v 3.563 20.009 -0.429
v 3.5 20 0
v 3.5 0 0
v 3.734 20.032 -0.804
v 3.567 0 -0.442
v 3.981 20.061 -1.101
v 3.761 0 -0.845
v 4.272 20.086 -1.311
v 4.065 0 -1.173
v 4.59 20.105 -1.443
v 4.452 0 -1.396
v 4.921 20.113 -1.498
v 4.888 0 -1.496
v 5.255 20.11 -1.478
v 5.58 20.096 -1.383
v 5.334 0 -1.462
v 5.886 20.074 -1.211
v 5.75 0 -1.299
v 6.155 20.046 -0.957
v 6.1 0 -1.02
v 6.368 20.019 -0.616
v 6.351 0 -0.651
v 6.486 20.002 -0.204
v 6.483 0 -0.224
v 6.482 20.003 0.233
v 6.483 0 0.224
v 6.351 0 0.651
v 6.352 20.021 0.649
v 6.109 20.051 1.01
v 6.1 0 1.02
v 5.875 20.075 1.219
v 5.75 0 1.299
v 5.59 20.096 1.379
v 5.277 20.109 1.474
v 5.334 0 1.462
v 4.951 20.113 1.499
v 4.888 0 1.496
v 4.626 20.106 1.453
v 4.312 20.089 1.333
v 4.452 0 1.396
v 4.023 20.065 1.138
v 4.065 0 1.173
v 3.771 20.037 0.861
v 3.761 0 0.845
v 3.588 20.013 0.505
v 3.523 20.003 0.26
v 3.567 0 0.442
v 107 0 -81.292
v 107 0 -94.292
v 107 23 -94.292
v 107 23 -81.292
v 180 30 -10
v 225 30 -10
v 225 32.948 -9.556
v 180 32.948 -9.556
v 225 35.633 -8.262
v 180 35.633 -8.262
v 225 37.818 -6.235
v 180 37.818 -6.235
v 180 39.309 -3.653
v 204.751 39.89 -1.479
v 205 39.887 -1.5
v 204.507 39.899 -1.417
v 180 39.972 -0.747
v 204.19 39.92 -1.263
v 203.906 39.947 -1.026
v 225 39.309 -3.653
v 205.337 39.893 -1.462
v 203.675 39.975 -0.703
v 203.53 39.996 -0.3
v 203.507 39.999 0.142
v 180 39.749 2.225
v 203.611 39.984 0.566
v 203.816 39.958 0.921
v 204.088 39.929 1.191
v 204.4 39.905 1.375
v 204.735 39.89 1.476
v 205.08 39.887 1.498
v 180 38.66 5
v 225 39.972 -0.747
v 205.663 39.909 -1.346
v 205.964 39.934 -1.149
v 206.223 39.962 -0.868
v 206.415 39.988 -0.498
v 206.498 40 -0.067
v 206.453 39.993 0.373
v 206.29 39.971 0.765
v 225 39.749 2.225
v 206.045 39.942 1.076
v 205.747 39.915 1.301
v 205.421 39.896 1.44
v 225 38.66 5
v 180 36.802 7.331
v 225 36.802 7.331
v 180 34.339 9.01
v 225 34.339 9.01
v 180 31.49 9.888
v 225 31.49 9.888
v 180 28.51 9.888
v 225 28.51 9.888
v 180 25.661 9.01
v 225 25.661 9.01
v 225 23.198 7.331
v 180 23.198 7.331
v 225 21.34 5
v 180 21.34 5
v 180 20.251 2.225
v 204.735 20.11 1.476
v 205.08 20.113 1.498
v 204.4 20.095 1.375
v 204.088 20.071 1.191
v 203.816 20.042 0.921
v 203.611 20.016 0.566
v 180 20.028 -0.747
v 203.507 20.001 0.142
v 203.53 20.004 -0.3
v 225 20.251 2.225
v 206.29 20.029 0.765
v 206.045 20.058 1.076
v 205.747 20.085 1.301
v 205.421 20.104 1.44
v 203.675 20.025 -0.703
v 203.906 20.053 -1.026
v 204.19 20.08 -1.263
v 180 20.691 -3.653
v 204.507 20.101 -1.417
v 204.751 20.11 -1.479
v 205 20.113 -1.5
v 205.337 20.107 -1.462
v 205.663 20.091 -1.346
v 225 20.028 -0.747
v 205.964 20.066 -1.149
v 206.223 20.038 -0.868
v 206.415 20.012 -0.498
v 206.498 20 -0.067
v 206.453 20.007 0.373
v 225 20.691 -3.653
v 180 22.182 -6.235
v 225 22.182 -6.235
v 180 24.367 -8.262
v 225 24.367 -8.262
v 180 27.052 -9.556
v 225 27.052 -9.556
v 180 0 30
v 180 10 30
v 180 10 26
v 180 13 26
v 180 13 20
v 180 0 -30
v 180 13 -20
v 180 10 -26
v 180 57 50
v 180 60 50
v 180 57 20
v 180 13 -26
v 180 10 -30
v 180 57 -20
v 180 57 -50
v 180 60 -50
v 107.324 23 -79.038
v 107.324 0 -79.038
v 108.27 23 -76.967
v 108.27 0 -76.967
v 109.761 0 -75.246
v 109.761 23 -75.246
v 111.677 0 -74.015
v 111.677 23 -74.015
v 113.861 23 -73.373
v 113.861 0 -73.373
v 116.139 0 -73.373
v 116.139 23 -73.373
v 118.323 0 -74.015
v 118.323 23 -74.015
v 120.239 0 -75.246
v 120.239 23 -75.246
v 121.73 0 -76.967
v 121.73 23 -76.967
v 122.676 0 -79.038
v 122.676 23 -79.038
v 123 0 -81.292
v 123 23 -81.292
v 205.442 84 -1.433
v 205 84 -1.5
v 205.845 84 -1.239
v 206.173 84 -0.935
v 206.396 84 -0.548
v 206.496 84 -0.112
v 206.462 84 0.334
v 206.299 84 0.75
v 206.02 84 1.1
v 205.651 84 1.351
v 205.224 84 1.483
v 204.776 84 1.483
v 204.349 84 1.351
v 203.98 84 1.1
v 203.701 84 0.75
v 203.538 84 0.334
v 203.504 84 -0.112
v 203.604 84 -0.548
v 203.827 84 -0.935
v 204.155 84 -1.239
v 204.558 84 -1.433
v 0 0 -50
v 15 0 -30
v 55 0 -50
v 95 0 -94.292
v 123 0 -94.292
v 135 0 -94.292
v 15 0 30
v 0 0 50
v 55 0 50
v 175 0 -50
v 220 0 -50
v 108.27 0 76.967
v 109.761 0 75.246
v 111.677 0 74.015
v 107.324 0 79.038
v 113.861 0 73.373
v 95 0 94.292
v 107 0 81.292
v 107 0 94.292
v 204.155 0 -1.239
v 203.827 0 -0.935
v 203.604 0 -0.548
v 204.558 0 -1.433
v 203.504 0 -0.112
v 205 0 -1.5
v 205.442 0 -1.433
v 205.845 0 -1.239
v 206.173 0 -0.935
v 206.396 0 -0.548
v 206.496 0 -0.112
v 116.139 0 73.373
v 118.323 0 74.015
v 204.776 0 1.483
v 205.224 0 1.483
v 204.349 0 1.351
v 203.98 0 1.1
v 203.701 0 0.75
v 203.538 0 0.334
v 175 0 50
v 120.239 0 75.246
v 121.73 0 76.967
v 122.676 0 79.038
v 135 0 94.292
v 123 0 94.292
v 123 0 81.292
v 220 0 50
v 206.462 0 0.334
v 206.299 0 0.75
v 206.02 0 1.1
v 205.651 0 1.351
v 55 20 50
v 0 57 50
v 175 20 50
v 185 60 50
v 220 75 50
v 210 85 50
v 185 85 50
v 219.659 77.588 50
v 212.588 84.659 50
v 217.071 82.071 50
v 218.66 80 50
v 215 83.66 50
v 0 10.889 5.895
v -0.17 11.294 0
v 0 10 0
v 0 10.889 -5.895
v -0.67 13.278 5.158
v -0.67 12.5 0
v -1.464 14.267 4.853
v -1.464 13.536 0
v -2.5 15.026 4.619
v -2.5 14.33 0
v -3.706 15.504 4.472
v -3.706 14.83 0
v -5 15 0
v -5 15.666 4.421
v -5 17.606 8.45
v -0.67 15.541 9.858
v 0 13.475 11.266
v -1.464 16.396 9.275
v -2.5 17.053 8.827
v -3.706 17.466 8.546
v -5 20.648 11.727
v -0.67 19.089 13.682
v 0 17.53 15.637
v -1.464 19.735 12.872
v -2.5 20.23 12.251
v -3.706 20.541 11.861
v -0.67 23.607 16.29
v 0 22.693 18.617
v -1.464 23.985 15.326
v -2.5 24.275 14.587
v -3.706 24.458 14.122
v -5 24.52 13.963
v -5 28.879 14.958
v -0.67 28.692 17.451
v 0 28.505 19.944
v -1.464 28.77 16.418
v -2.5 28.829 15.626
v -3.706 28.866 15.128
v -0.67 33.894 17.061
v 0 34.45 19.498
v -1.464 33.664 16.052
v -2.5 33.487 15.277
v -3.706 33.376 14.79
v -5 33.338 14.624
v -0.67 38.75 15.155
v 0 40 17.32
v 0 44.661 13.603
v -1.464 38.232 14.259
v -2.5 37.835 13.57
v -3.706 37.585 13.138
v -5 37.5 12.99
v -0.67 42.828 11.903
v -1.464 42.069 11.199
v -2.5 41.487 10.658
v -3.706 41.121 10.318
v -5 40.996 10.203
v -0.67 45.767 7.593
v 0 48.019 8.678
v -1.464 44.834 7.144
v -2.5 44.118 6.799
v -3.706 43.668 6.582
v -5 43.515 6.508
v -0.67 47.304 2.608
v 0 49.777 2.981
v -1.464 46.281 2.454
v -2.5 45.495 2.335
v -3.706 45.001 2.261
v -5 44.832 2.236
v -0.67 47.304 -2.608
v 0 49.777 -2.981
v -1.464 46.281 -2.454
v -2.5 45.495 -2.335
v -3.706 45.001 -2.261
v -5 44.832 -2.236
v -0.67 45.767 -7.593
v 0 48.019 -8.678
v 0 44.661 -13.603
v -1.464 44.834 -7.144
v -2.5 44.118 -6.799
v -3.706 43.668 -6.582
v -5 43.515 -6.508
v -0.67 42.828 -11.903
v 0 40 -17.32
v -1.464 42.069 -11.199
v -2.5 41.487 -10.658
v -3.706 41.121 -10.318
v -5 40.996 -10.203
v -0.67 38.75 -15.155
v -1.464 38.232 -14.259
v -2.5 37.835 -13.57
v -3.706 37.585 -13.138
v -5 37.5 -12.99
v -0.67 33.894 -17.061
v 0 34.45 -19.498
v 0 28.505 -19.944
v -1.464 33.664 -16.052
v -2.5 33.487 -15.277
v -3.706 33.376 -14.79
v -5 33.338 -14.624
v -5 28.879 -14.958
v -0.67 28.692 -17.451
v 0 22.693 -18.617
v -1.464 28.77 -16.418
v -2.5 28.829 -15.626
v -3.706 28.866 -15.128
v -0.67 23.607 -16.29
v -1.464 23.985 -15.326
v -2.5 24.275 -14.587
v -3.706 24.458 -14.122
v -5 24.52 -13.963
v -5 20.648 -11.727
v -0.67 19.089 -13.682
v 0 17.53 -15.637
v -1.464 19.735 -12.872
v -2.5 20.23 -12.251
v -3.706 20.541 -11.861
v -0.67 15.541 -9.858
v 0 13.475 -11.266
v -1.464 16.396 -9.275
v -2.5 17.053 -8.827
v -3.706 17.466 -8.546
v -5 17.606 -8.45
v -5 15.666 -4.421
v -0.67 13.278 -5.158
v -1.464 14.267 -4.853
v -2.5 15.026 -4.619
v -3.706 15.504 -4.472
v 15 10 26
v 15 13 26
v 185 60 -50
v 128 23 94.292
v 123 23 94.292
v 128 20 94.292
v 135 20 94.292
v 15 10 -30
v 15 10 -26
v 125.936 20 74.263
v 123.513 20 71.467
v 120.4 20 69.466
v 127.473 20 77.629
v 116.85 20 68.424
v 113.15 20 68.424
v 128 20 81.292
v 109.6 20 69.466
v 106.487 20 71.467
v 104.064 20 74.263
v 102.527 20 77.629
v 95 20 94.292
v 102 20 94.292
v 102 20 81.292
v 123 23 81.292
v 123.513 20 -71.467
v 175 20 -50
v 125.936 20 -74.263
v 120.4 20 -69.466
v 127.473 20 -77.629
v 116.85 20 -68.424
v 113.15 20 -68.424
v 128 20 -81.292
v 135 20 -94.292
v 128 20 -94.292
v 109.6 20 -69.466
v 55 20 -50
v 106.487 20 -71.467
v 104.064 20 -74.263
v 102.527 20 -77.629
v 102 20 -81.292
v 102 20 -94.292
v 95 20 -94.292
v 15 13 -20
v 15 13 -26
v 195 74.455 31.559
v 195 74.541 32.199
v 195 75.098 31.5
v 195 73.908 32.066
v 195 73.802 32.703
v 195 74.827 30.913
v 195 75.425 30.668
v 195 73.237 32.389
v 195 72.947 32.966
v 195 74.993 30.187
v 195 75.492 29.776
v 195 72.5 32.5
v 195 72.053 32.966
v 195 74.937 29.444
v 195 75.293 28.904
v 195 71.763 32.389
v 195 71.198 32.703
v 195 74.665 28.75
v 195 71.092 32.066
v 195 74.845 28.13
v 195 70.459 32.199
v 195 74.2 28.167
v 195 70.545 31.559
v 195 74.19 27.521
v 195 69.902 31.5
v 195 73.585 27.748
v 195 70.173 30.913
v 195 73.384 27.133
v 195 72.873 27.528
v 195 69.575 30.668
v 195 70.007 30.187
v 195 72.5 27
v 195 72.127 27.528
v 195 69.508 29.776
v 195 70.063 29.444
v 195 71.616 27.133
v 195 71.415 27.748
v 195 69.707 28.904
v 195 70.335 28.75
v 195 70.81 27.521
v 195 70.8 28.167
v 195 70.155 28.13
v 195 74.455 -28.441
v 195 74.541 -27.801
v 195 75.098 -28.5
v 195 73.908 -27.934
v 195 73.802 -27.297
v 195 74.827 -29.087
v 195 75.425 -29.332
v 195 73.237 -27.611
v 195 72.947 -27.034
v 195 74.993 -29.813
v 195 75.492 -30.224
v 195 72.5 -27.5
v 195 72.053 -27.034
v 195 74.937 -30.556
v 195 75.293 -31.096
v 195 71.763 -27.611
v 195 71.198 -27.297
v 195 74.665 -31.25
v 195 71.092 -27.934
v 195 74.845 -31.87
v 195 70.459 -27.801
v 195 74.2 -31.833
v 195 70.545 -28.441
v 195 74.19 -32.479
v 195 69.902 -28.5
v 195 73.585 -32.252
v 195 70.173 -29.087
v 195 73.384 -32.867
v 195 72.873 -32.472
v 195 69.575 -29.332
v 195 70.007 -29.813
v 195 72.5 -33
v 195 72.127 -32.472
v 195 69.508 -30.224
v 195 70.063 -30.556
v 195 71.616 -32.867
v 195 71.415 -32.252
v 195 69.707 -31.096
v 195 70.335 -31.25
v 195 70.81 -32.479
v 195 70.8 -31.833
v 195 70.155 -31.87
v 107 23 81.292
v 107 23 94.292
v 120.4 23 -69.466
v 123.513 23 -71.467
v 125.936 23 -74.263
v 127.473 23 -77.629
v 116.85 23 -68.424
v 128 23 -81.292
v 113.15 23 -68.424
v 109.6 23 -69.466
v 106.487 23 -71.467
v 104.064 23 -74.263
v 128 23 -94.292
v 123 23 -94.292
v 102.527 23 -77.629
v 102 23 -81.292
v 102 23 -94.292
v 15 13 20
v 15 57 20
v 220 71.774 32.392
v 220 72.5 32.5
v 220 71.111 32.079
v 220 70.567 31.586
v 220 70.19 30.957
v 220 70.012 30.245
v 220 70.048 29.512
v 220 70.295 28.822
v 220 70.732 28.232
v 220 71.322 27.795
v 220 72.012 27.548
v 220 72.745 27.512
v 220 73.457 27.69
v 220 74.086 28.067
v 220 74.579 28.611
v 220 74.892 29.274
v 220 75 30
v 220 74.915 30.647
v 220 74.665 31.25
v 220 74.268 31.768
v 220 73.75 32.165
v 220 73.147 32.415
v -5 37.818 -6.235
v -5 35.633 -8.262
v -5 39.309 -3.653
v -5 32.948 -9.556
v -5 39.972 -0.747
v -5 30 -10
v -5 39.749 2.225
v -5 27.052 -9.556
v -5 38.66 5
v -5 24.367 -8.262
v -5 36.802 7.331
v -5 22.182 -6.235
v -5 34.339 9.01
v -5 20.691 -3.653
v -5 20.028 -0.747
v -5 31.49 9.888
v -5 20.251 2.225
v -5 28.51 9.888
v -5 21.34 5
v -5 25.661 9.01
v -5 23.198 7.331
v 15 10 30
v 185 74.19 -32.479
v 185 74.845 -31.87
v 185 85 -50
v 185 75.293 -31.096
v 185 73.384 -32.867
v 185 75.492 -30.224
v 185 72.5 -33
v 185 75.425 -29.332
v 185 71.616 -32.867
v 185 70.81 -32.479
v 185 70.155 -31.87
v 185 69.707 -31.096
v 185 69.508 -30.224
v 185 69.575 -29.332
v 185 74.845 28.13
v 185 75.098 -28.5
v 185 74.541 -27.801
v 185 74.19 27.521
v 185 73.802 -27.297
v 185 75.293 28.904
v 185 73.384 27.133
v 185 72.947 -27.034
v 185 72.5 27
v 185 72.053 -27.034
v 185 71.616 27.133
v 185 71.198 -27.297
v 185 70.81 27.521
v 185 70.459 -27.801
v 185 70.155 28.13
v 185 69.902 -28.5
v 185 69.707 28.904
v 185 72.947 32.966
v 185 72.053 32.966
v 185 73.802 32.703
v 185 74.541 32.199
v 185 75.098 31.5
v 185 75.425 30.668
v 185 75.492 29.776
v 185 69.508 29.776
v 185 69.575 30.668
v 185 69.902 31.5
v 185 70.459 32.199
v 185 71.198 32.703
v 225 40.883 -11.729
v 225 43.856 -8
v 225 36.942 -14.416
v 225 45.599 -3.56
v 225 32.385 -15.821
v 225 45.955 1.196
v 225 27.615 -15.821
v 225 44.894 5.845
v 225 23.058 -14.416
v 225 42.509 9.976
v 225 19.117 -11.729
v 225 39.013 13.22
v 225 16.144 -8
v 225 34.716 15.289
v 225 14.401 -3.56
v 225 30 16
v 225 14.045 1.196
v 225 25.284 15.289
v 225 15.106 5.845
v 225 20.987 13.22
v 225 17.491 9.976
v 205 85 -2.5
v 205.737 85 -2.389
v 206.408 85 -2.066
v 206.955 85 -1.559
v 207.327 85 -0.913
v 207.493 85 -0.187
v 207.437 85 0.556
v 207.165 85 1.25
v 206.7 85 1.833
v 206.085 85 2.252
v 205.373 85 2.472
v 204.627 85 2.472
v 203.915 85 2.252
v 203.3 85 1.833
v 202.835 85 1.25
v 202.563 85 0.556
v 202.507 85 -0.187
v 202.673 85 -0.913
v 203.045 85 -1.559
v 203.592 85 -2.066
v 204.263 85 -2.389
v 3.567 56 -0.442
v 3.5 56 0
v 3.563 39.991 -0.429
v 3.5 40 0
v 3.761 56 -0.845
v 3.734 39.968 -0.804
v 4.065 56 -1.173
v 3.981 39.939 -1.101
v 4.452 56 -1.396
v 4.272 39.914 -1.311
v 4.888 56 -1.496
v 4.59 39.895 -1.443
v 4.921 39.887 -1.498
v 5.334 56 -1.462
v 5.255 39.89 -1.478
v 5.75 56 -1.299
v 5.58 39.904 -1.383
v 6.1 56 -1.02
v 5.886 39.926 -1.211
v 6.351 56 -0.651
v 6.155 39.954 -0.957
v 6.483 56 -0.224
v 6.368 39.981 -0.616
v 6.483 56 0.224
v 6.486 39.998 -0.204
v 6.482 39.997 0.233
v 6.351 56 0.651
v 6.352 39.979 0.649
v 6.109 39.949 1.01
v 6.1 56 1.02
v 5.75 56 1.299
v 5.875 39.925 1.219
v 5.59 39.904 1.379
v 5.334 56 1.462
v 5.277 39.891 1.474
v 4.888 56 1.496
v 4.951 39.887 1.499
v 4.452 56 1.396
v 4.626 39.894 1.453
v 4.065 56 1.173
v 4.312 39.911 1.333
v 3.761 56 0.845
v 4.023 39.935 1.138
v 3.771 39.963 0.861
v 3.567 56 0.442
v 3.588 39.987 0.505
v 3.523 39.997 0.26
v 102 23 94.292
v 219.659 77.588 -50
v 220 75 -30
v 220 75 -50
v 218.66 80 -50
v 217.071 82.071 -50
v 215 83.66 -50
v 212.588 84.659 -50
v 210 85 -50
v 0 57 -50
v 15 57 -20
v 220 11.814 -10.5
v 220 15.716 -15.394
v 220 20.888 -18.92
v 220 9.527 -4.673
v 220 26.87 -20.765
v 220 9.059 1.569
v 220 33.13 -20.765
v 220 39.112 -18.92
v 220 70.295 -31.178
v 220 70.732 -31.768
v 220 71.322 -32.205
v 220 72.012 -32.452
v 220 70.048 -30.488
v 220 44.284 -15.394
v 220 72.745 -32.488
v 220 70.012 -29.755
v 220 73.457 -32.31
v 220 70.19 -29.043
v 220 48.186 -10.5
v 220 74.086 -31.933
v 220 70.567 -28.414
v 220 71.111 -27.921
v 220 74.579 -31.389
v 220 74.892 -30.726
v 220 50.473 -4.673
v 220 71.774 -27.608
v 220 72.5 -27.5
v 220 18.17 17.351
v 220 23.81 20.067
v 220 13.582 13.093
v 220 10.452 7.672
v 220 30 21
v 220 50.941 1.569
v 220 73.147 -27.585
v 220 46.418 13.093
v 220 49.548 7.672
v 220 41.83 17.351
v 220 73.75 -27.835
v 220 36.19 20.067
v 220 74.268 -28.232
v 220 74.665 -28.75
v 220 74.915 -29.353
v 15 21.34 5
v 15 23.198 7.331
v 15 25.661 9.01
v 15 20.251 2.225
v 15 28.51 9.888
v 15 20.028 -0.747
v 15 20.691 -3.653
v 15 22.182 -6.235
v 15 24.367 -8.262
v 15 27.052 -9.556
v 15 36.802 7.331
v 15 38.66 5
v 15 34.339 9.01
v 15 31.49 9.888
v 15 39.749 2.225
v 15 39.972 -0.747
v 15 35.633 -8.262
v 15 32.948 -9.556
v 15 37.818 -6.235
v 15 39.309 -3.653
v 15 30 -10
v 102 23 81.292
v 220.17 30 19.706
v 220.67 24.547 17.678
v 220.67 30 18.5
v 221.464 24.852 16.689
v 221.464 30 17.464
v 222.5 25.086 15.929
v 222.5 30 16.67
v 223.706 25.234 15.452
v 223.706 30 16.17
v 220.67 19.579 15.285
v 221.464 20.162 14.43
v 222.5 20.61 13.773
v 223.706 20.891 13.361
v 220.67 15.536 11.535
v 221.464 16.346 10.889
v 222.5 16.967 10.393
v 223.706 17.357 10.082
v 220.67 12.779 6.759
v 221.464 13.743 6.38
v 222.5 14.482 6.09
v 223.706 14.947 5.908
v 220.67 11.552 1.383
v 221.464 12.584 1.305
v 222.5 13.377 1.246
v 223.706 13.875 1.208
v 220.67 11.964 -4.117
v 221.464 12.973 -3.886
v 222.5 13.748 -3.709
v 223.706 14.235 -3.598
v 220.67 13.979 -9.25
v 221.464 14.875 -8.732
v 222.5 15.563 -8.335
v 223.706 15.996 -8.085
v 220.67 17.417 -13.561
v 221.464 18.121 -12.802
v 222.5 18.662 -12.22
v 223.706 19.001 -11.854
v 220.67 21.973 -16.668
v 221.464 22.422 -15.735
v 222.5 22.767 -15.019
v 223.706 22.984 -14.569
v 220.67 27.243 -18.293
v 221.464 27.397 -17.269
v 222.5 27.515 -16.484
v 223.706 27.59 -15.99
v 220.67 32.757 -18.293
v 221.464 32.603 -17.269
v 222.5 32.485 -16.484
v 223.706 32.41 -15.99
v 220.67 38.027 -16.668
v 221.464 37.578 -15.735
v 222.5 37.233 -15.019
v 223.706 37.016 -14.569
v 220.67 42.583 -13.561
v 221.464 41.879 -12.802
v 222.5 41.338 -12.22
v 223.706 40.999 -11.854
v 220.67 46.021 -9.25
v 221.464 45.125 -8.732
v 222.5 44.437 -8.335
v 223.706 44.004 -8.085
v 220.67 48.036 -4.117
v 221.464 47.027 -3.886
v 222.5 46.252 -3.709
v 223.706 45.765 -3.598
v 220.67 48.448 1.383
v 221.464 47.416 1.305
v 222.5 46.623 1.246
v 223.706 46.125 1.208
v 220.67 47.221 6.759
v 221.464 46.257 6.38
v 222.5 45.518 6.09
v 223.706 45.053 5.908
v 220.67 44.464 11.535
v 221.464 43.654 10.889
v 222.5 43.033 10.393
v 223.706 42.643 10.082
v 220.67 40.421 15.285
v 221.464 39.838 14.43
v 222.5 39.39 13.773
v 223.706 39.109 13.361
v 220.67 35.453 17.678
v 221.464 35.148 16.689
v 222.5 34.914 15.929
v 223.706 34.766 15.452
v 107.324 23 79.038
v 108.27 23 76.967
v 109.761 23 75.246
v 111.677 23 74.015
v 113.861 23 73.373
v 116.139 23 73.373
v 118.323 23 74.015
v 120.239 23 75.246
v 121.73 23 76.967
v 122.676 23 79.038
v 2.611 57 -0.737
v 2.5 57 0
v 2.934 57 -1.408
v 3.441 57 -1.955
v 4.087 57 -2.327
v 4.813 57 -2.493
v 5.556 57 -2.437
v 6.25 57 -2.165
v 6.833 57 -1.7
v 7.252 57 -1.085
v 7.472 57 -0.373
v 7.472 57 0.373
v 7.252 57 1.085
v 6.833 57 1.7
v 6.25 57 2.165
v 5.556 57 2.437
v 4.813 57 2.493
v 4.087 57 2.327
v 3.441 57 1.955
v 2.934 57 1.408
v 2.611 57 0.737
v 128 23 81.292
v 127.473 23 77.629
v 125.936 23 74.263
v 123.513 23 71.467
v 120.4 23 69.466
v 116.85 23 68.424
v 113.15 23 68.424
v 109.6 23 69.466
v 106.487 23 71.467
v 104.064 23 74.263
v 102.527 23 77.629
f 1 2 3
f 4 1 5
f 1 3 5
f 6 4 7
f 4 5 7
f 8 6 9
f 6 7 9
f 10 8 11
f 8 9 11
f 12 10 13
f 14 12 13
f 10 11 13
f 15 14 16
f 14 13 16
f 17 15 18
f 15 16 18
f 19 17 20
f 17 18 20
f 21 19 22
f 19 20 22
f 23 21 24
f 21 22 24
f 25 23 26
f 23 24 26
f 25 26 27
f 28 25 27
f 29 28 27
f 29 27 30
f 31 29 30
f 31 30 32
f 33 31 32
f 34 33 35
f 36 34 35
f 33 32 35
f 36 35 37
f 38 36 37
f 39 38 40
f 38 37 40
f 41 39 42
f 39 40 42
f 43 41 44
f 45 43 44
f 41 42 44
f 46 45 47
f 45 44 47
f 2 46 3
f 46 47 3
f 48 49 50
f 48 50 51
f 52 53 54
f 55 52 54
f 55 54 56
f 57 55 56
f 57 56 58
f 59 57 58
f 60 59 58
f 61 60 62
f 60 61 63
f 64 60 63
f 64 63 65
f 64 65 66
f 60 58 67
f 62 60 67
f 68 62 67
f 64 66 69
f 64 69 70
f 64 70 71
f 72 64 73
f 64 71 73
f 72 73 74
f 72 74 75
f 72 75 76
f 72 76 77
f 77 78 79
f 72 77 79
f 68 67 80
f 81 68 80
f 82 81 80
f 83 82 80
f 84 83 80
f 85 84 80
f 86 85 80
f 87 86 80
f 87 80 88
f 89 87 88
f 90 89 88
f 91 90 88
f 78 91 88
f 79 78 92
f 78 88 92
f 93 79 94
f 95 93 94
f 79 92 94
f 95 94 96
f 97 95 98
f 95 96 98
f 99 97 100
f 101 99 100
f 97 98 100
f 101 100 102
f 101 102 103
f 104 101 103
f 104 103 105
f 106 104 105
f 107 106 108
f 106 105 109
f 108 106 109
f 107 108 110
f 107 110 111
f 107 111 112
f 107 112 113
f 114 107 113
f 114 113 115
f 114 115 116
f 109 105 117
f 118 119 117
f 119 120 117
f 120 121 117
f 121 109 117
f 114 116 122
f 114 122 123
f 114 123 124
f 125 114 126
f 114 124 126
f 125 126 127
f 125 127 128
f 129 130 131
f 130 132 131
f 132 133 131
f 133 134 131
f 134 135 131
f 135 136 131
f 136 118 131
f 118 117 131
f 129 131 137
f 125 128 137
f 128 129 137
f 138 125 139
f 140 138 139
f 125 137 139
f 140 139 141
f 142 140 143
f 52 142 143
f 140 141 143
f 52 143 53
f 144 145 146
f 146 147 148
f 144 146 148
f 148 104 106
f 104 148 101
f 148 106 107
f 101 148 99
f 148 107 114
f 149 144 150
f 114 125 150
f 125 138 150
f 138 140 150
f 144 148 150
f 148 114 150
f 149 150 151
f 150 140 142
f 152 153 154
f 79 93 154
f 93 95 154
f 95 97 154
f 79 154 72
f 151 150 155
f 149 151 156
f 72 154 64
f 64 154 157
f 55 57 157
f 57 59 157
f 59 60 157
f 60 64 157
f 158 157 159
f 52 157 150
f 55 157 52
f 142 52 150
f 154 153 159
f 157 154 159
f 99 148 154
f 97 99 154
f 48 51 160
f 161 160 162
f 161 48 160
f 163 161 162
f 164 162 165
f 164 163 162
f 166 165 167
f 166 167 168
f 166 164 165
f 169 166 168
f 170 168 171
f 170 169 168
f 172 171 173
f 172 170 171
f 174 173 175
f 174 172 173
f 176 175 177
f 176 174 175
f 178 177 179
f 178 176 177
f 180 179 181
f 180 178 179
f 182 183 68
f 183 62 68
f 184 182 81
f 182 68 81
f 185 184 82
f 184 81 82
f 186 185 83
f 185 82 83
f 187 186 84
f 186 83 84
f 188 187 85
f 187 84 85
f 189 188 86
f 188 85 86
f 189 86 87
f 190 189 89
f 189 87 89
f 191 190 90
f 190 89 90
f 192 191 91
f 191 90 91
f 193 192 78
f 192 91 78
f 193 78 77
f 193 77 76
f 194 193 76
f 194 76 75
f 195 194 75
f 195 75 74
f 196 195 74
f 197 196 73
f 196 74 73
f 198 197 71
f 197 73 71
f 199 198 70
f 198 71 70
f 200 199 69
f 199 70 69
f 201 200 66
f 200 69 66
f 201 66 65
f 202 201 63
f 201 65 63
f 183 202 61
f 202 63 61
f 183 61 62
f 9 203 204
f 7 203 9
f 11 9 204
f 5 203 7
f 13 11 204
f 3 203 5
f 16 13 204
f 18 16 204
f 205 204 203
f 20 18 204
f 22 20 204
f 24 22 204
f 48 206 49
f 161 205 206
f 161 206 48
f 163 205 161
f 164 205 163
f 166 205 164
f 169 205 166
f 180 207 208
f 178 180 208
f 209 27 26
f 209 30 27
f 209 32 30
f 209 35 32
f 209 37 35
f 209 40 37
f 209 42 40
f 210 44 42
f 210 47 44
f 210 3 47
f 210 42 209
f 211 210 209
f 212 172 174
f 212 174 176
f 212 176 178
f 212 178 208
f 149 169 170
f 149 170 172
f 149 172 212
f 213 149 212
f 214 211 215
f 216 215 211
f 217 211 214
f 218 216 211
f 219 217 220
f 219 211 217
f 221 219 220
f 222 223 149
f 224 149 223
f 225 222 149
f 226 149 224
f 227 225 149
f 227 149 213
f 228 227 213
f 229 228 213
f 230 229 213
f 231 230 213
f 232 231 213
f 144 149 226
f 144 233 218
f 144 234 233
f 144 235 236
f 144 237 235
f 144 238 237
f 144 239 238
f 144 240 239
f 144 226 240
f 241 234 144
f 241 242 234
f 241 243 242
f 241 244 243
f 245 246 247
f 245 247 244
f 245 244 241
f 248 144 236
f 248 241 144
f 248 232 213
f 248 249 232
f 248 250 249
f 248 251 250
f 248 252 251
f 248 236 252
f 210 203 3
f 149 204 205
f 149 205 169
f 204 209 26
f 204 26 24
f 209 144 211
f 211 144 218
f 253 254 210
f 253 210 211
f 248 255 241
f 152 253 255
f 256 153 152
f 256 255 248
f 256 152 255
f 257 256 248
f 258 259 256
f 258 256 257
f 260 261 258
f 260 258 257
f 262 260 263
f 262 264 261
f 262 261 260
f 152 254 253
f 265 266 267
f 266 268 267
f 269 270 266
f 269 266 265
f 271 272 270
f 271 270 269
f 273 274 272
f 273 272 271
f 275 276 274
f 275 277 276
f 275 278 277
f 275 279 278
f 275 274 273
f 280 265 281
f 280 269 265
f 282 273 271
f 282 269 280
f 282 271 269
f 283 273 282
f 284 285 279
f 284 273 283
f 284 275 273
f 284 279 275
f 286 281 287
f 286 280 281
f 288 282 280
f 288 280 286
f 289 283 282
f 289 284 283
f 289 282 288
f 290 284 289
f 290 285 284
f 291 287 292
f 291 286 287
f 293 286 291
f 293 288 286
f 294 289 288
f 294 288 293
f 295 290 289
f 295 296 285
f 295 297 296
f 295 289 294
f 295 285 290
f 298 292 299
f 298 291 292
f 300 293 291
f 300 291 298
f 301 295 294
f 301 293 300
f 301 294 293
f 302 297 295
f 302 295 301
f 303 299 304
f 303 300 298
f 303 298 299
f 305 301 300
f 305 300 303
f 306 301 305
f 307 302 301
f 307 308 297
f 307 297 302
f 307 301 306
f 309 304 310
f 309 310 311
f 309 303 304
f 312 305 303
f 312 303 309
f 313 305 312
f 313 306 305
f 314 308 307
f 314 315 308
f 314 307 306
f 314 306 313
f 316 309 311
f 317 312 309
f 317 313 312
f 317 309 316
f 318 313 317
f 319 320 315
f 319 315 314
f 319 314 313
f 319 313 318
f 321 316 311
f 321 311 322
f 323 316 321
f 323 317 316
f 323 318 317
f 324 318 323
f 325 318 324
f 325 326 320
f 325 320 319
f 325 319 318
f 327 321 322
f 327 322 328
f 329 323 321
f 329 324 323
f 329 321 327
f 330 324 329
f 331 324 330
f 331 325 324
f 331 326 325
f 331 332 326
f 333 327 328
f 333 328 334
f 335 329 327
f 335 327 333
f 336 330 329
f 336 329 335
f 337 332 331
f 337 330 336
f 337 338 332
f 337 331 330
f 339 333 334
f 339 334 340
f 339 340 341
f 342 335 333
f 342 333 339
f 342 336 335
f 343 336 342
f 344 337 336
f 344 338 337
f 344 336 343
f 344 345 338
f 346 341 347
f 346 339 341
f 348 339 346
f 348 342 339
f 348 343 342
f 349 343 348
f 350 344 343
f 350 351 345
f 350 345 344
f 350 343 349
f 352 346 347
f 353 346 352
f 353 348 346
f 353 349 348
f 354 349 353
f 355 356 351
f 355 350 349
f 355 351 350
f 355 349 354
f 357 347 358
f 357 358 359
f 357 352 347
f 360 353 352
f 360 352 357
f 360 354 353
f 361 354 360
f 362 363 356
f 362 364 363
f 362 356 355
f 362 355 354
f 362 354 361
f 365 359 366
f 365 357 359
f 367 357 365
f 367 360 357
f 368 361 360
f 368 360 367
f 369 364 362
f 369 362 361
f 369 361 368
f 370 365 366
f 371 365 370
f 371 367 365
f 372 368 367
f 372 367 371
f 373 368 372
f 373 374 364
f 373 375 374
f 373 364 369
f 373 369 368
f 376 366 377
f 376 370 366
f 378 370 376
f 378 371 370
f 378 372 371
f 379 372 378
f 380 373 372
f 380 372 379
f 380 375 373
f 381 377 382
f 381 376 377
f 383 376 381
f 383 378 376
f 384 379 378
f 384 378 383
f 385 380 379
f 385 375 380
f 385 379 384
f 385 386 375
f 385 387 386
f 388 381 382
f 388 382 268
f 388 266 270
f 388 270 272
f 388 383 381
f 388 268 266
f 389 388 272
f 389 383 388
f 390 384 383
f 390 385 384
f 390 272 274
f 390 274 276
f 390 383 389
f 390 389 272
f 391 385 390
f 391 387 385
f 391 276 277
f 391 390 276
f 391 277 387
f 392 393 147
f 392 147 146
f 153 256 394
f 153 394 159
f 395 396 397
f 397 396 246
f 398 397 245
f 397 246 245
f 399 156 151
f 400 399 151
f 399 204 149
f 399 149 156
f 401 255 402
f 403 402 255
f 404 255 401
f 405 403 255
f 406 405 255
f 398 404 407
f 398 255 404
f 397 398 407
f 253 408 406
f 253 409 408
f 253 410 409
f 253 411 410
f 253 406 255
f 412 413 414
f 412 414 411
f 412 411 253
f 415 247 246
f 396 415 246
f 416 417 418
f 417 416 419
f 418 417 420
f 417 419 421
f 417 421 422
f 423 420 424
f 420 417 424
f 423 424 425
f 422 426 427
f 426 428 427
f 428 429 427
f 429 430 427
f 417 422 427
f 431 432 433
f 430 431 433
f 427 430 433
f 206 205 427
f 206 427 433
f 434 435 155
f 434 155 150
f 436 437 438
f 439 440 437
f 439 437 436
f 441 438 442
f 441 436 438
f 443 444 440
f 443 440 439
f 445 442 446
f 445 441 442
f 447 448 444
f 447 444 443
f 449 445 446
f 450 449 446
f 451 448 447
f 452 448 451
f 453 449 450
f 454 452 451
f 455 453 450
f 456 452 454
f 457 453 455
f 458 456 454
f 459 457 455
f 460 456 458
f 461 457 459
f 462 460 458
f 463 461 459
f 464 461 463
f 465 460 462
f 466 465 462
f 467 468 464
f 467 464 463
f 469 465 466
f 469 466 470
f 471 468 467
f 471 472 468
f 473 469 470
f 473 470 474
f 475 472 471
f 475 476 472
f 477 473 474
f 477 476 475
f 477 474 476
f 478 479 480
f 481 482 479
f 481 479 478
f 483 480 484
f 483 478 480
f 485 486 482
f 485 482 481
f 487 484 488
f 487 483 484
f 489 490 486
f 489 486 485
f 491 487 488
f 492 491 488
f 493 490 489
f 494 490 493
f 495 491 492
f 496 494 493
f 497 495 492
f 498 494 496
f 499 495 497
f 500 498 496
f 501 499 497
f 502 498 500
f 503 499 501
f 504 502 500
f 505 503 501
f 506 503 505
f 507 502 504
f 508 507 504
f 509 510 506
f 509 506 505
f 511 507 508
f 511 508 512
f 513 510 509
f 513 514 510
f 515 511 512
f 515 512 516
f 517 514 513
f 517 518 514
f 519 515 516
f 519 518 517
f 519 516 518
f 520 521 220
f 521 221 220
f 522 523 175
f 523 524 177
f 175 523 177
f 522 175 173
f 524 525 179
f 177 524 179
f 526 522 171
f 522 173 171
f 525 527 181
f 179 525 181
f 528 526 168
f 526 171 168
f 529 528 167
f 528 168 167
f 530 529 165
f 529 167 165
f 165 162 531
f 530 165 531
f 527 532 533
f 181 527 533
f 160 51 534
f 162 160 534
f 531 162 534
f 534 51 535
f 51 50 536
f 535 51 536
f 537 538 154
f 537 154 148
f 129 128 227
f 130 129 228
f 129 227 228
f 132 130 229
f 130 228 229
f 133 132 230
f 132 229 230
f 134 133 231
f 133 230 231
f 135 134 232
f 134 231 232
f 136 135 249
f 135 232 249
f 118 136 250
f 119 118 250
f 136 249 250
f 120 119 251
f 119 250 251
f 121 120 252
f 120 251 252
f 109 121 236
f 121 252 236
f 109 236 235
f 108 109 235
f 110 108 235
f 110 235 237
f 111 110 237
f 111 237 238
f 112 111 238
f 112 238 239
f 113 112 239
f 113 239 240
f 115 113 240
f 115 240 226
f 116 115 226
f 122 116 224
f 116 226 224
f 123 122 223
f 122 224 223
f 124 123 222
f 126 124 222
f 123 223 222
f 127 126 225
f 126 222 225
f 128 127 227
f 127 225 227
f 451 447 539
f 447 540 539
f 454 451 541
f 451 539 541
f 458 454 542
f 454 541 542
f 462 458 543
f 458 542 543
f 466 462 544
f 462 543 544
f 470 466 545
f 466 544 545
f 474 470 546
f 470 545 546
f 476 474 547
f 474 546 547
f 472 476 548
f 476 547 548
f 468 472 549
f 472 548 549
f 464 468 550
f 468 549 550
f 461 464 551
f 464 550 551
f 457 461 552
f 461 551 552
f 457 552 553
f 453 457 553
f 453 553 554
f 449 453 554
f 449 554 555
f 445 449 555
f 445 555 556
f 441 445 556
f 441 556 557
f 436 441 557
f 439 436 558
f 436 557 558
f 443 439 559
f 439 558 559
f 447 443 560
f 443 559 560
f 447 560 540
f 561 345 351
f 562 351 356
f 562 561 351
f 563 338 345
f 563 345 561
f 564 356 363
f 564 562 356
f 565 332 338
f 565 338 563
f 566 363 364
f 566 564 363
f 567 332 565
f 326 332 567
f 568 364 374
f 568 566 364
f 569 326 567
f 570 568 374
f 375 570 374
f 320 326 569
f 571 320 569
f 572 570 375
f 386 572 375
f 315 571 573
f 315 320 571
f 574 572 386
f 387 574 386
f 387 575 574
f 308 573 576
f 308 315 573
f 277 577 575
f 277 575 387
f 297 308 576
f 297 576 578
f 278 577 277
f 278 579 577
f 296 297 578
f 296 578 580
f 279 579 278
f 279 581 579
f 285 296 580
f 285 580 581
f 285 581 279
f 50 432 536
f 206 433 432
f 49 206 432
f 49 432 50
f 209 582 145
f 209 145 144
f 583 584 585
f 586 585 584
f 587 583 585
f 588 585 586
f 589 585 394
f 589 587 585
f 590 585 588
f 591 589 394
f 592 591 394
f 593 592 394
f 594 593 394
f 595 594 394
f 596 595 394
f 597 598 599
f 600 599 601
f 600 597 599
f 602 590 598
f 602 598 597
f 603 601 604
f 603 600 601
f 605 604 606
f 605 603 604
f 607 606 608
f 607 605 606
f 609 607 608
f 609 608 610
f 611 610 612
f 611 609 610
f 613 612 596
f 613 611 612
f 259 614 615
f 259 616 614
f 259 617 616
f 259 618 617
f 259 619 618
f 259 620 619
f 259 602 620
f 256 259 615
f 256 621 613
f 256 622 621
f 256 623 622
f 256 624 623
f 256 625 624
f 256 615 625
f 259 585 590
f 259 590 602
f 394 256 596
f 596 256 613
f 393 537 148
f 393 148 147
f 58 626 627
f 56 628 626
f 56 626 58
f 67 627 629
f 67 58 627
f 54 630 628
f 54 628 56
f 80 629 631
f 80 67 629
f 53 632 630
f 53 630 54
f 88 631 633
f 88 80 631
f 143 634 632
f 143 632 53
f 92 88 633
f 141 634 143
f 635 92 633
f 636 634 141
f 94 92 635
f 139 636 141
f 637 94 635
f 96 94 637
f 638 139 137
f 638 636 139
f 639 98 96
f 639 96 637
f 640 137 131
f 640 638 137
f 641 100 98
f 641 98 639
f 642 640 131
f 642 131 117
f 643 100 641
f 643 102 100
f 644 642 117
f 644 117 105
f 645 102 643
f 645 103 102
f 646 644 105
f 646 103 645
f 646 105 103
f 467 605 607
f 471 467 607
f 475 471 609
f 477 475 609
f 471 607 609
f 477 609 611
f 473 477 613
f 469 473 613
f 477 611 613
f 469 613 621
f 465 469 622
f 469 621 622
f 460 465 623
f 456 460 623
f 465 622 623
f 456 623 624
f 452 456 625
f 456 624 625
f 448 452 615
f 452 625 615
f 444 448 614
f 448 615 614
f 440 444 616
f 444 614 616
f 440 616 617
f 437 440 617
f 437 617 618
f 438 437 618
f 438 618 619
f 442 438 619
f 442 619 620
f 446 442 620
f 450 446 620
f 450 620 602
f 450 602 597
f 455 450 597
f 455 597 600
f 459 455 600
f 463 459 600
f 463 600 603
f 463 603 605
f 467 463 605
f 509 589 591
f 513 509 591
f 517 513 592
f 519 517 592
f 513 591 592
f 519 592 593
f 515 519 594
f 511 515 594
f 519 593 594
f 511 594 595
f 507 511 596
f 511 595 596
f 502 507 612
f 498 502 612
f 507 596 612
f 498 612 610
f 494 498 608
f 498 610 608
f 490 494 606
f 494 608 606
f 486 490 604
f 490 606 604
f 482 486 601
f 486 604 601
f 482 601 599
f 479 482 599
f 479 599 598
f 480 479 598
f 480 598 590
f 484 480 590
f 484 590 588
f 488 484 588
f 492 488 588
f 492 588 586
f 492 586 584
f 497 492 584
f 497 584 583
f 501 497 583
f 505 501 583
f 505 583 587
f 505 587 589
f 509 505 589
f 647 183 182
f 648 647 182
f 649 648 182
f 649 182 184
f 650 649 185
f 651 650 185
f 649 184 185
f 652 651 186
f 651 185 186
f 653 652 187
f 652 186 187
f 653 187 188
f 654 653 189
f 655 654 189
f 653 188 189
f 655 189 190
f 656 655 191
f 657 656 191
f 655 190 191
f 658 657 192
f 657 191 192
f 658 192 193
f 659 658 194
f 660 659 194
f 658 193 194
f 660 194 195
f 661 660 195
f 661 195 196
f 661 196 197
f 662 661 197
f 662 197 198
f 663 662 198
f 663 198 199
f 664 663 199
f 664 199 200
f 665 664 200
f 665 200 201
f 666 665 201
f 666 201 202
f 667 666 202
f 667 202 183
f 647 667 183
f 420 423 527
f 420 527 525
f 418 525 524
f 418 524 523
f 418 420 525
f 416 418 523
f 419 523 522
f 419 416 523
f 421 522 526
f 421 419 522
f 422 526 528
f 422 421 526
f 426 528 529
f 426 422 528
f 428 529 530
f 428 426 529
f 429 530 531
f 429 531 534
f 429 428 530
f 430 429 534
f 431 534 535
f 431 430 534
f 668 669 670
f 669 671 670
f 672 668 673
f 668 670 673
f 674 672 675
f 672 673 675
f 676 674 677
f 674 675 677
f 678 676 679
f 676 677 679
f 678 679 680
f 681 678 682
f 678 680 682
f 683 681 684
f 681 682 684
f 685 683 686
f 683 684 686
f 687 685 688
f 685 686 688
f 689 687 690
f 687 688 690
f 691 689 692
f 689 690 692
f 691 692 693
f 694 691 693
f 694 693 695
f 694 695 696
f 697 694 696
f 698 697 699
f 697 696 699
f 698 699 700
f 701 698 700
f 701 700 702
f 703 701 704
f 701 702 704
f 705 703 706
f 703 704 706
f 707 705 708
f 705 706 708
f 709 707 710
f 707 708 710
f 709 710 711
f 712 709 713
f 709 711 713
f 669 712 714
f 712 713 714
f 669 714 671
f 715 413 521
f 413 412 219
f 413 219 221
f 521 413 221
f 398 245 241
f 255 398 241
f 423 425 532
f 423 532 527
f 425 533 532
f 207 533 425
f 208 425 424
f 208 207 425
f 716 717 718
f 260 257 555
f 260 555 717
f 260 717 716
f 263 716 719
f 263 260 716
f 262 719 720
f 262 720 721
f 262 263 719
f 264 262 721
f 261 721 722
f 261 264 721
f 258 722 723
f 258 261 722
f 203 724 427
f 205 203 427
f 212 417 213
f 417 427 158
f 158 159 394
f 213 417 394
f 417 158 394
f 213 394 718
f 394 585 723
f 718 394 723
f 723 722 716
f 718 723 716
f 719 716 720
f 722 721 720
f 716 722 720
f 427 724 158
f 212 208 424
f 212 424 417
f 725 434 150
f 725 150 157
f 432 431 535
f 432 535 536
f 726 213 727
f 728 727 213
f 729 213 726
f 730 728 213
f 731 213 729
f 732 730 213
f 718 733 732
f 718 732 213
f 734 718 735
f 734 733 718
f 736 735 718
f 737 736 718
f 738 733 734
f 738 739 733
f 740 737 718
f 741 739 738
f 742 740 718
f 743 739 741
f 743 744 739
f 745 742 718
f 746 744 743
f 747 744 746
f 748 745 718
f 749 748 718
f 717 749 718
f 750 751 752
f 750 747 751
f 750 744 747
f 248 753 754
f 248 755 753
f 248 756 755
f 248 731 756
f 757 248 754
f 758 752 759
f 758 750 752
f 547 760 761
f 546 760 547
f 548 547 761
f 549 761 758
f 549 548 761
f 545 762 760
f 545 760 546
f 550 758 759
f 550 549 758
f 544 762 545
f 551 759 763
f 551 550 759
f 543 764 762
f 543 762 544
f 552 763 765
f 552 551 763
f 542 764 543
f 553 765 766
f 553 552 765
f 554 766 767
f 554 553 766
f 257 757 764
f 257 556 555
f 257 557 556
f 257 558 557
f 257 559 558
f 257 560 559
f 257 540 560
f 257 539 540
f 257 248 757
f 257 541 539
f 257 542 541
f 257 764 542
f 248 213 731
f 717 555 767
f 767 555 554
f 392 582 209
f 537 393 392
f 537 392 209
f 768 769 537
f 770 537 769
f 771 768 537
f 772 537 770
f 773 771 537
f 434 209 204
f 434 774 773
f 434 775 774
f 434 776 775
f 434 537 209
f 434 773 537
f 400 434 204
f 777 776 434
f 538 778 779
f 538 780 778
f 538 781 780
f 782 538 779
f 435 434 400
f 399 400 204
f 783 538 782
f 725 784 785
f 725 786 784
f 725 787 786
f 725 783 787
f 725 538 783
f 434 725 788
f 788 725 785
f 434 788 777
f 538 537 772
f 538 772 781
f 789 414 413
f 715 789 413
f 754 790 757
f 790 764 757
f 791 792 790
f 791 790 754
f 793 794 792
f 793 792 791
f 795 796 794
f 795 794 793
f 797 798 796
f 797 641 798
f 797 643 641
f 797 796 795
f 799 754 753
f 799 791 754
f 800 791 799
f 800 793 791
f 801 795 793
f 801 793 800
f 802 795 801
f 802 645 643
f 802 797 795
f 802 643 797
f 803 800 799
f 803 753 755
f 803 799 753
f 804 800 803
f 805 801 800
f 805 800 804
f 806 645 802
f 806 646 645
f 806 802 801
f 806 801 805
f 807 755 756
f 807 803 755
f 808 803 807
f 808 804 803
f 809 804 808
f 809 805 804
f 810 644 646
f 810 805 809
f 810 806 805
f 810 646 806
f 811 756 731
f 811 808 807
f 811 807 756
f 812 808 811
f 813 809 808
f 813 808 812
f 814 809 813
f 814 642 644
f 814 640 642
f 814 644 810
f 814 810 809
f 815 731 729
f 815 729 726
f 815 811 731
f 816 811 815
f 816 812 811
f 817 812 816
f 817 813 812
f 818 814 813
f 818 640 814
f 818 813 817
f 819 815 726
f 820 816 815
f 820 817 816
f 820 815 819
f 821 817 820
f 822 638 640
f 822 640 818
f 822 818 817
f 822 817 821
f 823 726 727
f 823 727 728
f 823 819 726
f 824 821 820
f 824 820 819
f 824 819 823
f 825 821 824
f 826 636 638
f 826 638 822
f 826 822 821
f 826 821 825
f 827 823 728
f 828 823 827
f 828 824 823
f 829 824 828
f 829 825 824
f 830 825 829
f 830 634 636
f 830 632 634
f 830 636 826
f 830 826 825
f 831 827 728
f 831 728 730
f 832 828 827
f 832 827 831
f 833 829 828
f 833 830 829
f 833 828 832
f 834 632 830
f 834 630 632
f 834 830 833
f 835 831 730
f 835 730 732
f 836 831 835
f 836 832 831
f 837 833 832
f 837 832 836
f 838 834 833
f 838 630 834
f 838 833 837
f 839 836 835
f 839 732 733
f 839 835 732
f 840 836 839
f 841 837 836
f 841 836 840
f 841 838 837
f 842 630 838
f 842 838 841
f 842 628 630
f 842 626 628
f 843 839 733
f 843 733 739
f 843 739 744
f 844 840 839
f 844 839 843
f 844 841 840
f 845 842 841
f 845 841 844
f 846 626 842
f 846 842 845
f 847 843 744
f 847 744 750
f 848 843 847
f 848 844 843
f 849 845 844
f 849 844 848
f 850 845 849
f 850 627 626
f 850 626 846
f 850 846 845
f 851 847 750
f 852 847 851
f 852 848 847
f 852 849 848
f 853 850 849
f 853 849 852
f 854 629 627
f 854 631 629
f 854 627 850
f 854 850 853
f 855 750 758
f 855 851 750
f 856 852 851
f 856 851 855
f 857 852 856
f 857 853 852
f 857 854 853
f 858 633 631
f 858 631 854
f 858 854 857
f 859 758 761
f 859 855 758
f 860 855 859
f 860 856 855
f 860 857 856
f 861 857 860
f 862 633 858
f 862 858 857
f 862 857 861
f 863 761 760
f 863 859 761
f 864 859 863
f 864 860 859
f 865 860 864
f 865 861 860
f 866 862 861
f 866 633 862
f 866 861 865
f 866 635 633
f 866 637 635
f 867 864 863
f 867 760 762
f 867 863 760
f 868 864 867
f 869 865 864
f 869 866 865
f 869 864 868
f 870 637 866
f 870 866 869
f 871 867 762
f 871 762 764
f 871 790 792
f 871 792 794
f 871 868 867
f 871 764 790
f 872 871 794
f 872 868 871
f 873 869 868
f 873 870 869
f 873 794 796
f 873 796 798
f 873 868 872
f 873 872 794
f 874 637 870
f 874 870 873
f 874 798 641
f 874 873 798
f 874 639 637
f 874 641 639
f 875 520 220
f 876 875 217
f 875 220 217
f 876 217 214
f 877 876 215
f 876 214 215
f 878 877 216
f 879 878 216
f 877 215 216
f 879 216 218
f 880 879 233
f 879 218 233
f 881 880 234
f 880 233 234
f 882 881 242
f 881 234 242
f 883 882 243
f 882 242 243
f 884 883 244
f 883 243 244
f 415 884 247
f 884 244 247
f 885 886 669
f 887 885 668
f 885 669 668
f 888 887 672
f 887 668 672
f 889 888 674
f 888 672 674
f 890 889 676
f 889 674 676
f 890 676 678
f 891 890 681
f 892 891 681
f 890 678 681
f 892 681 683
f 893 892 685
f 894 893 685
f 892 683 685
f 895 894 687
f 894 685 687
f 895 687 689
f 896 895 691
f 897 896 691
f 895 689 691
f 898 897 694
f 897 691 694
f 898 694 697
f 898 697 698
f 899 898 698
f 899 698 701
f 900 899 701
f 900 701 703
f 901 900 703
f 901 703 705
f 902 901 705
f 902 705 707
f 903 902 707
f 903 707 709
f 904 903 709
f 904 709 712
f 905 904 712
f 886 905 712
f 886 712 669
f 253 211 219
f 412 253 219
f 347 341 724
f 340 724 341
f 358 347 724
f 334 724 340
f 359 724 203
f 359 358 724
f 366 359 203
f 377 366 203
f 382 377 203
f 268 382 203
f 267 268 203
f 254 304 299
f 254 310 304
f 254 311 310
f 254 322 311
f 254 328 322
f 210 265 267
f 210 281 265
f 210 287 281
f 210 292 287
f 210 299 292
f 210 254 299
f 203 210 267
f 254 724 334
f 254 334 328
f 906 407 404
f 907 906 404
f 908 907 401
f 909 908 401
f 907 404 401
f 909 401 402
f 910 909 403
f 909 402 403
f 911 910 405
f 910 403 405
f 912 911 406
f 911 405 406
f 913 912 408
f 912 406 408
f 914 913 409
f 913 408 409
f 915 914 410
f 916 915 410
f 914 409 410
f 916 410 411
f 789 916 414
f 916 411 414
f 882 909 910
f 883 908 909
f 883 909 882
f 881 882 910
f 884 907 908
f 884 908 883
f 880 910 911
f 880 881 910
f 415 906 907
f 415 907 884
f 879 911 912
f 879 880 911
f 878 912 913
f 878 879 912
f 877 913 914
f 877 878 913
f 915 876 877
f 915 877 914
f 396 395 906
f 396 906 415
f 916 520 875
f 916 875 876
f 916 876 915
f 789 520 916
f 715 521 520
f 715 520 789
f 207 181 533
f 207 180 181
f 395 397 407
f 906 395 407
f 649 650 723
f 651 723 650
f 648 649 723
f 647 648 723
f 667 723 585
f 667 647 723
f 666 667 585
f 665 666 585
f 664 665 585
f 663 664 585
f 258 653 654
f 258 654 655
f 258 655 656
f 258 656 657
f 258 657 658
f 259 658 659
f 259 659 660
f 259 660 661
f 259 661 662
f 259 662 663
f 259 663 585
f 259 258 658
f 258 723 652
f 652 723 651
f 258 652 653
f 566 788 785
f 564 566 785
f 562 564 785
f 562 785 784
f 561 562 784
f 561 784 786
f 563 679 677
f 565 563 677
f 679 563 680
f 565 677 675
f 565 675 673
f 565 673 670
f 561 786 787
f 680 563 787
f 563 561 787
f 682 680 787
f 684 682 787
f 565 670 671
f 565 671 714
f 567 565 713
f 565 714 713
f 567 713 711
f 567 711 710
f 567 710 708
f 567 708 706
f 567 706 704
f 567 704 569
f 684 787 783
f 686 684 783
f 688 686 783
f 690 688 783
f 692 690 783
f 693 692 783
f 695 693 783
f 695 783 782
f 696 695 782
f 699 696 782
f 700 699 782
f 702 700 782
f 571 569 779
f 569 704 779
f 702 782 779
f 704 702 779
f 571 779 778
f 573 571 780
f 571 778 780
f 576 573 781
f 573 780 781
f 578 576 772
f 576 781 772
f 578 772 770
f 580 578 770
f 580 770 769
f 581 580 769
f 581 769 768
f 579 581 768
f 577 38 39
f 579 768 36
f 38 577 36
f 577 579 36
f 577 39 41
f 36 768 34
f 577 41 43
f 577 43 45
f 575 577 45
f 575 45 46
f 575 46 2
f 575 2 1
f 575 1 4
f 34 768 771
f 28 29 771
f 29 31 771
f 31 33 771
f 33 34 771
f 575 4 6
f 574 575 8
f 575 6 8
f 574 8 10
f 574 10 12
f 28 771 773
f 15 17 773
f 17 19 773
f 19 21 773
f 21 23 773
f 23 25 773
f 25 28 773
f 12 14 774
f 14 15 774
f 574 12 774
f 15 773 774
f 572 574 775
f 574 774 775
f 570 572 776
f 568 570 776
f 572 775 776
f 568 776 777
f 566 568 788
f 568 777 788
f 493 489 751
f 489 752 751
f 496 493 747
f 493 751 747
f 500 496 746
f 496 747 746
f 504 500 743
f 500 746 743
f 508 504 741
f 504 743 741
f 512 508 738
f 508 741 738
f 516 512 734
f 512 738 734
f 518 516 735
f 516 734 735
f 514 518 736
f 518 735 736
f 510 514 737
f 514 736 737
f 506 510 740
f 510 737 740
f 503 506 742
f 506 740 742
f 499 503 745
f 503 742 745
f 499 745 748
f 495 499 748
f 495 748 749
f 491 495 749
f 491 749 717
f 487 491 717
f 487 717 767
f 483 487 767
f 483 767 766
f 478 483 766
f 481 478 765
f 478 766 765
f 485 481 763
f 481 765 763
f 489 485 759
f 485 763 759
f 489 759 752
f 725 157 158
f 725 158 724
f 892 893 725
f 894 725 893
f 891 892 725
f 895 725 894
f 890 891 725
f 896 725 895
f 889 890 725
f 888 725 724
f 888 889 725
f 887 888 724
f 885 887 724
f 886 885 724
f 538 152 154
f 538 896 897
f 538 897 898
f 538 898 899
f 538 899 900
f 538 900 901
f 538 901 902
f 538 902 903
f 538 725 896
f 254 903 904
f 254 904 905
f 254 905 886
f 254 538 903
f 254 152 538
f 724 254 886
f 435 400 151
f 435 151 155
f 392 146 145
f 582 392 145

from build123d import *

# Parameters (mm, degrees)
BOSS_EXTRUDE1_DEPTH = 50
CUT_EXTRUDE1_START  = -15
CUT_EXTRUDE1_DEPTH  = 165
SKETCH3_R           = 15
BOSS_EXTRUDE2_DEPTH = 5
SKETCH4_R           = 16
BOSS_EXTRUDE3_DEPTH = 5
SKETCH5_R           = 10
CUT_EXTRUDE2_DEPTH  = 251.249875125
FILLET1_R           = 5
HOLE1_D             = 5
HOLE1_DEPTH         = 40
HOLE1_CBORE_D       = 6
HOLE1_CBORE_DEPTH   = 10
HOLE1_TIP           = 1.502151548
HOLE2_D             = 3
HOLE2_CSINK_D       = 5
HOLE2_CSINK_ANGLE   = 90
HOLE4_D             = 3
HOLE4_CSINK_D       = 5
HOLE4_CSINK_ANGLE   = 90
BOSS_EXTRUDE7_DEPTH = 20
BOSS_EXTRUDE9_DEPTH = 3


with BuildPart() as part:
    # Sketch1 → Boss-Extrude1 (new, symmetric)
    with BuildSketch(Plane.XY):
        with BuildLine():
            Line((0, 0), (220, 0))
            Line((220, 0), (220, 75))
            ThreePointArc((220, 75), (217.071067812, 82.071067812), (210, 85))
            Line((210, 85), (185, 85))
            Line((185, 85), (185, 60))
            Line((185, 60), (180, 60))
            Line((180, 60), (180, 57))
            Line((180, 57), (0, 57))
            Line((0, 57), (0, 0))
        make_face()
    extrude(amount=BOSS_EXTRUDE1_DEPTH, both=True)

    # Sketch2 → Cut-Extrude1 (cut)
    with BuildSketch(Plane.ZY.offset(CUT_EXTRUDE1_START)):
        Polygon((-30, 0), (-30, 10), (-26, 10), (-26, 13), (-20, 13), (-20, 57), (20, 57), (20, 13), (26, 13), (26, 10), (30, 10), (30, 0), align=None)
    extrude(amount=-CUT_EXTRUDE1_DEPTH, mode=Mode.SUBTRACT)

    # Sketch3 → Boss-Extrude2 (add)
    with BuildSketch(Plane.ZY):
        with Locations(Location((0, 30, 0), (0, 0, 270))):
            Circle(SKETCH3_R)
    extrude(amount=BOSS_EXTRUDE2_DEPTH)

    # Sketch4 → Boss-Extrude3 (add)
    with BuildSketch(Plane(origin=(220, 0, 0), x_dir=(0, 0, -1), z_dir=(1, 0, 0))):
        with Locations(Location((0, 30, 0), (0, 0, 180))):
            Circle(SKETCH4_R)
    extrude(amount=BOSS_EXTRUDE3_DEPTH)

    # Sketch5 → Cut-Extrude2 (cut, through all)
    with BuildSketch(Plane(origin=(225, 0, 0), x_dir=(0, 0, -1), z_dir=(1, 0, 0))):
        with Locations((0, 30)):
            Circle(SKETCH5_R)
    extrude(amount=-CUT_EXTRUDE2_DEPTH, mode=Mode.SUBTRACT)

    # Fillet1
    fillet1_edges = [part.edges().sort_by_distance(p)[0] for p in [
        (0, 45, 0),
        (220, 30, -16),
    ]]
    fillet(fillet1_edges, radius=FILLET1_R - 0.0001)  # a hair under: the kernel refuses the full size

    # Hole1
    with Locations(Plane(origin=(185, 72.5, -30), x_dir=(0, 0, -1), z_dir=(-1, 0, 0))):
        with Locations((0, 0), (-60, 0)):
            CounterBoreHole(HOLE1_D / 2, HOLE1_CBORE_D / 2, HOLE1_CBORE_DEPTH, depth=HOLE1_DEPTH)
            with Locations((0, 0, -(HOLE1_DEPTH + HOLE1_TIP / 2))):  # 118° drill point
                Cone(0, HOLE1_D / 2, HOLE1_TIP, mode=Mode.SUBTRACT)

    # Hole2 (through all)
    with Locations(Plane(origin=(205, 85, 0), x_dir=(0, 0, 1), z_dir=(0, 1, 0))):
        with Locations((0, 0)):
            CounterSinkHole(HOLE2_D / 2, HOLE2_CSINK_D / 2, counter_sink_angle=HOLE2_CSINK_ANGLE)

    # Hole4 (through all)
    with Locations(Plane(origin=(5, 57, 0), x_dir=(1, 0, 0), z_dir=(0, 1, 0))):
        with Locations((0, 0)):
            CounterSinkHole(HOLE4_D / 2, HOLE4_CSINK_D / 2, counter_sink_angle=HOLE4_CSINK_ANGLE)

    # Sketch18 → Boss-Extrude7 (add)
    with BuildSketch(Plane.XZ):
        with BuildLine():
            Line((55, 50), (95, 94.291635381))
            Line((95, 94.291635381), (107, 94.291635381))
            Line((107, 94.291635381), (107, 81.291635381))
            ThreePointArc((107, 81.291635381), (115, 73.291635381), (123, 81.291635381))
            Line((123, 81.291635381), (123, 94.291635381))
            Line((123, 94.291635381), (135, 94.291635381))
            Line((135, 94.291635381), (175, 50))
            Line((175, 50), (55, 50))
        make_face()
    boss_extrude7 = extrude(amount=-BOSS_EXTRUDE7_DEPTH)

    # Mirror4: Boss-Extrude7 across plane
    add(boss_extrude7.mirror(Plane.XY))

    # Sketch21 → Boss-Extrude9 (add)
    with BuildSketch(Plane(origin=(0, 20, 0), x_dir=(1, 0, 0), z_dir=(0, 1, 0))):
        with BuildLine():
            Line((128, 94.291635381), (128, 81.291635381))
            ThreePointArc((128, 81.291635381), (115, 68.291635381), (102, 81.291635381))
            Line((102, 81.291635381), (102, 94.291635381))
            Line((102, 94.291635381), (107, 94.291635381))
            Line((107, 94.291635381), (107, 81.291635381))
            ThreePointArc((107, 81.291635381), (115, 73.291635381), (123, 81.291635381))
            Line((123, 81.291635381), (123, 94.291635381))
            Line((123, 94.291635381), (128, 94.291635381))
        make_face()
    boss_extrude9 = extrude(amount=BOSS_EXTRUDE9_DEPTH)

    # Mirror5: Boss-Extrude9 across plane
    add(boss_extrude9.mirror(Plane.XY))


solid = part.part
